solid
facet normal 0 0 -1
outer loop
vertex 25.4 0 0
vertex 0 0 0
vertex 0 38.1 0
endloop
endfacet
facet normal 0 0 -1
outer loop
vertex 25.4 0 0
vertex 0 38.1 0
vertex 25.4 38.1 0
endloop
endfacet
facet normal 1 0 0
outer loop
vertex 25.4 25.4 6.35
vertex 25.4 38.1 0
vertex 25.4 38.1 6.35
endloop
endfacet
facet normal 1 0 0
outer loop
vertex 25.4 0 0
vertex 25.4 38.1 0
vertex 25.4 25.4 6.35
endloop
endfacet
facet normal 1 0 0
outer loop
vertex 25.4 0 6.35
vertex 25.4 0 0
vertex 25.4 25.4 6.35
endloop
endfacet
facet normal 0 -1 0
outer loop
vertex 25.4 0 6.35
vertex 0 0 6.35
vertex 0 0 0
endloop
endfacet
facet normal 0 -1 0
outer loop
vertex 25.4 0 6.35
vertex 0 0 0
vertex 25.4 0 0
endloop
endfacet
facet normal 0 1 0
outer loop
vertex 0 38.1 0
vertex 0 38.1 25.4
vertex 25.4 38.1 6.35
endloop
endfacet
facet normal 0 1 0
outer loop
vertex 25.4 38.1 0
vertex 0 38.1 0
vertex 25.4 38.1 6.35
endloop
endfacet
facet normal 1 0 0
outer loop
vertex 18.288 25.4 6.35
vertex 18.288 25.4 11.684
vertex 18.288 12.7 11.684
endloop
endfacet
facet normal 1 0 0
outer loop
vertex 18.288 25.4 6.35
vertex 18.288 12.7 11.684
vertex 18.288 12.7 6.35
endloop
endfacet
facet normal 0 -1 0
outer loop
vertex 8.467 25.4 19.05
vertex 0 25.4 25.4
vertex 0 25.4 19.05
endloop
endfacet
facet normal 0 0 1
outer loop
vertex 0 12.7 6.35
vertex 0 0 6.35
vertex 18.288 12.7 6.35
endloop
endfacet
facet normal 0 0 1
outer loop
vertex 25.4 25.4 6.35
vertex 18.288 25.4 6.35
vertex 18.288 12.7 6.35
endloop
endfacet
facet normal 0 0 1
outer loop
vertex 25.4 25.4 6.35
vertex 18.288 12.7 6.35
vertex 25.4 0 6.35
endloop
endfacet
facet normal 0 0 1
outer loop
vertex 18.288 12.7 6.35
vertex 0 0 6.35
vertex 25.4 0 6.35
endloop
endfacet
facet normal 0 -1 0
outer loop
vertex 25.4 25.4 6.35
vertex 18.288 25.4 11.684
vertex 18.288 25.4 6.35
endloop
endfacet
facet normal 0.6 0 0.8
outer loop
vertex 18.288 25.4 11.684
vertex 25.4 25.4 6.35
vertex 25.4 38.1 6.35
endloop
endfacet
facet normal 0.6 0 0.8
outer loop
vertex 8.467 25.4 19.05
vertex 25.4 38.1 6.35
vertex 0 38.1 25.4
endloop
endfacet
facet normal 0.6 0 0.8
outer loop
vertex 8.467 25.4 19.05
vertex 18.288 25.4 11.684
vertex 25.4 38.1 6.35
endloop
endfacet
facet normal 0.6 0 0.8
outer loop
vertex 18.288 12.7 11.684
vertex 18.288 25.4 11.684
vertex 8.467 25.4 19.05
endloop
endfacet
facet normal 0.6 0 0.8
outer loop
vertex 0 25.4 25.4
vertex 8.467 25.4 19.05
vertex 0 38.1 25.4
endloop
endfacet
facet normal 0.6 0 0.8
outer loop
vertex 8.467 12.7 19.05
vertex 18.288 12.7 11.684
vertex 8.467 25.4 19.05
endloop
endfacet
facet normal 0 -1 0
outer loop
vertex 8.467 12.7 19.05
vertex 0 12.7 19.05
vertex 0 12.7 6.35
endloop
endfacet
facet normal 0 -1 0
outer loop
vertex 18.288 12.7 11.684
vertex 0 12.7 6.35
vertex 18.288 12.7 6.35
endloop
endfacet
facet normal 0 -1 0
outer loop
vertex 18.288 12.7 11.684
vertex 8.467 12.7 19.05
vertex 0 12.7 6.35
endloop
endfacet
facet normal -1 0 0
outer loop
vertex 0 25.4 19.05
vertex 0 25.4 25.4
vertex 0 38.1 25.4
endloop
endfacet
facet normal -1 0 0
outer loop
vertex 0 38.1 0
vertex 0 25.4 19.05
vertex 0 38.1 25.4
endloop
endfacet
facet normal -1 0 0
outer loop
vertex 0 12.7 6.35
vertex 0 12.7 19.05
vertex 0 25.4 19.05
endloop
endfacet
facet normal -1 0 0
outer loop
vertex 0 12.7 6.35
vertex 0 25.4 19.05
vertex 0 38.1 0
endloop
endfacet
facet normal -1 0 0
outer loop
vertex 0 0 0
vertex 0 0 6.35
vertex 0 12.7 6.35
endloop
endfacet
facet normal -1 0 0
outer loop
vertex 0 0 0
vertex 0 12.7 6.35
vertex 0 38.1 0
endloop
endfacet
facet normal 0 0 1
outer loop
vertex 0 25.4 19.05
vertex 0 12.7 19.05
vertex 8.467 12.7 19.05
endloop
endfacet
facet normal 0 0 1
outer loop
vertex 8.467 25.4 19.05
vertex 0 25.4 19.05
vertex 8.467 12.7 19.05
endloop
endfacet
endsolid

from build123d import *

# Parameters (mm, degrees)
F0_W     = 25.4
F0_H     = 6.35
F1_DEPTH = 38.1
F4_DEPTH = 25.4
F6_DEPTH = 12.7


with BuildPart() as f1:
    # F0 (on Front) → F1 (new body)
    with BuildSketch(Plane.XZ):
        with Locations((12.7, 3.175)):
            Rectangle(F0_W, F0_H)
    extrude(amount=-F1_DEPTH)

    # F3 (on offset) → F4 (join)
    with BuildSketch(Plane.XZ.offset(-12.7)):
        Polygon((0, 25.4), (0, 6.35), (25.4, 6.35), align=None)
    extrude(amount=-F4_DEPTH)

    # F5 (on face) → F6 (cut)
    with BuildSketch(Plane.XZ.offset(-12.7)):
        Polygon((8.4666666667, 19.05), (0, 25.4), (0, 19.05), align=None)
        Polygon((18.288, 6.35), (25.4, 6.35), (18.288, 11.684), align=None)
    extrude(amount=-F6_DEPTH, mode=Mode.SUBTRACT)


solid = f1.part
